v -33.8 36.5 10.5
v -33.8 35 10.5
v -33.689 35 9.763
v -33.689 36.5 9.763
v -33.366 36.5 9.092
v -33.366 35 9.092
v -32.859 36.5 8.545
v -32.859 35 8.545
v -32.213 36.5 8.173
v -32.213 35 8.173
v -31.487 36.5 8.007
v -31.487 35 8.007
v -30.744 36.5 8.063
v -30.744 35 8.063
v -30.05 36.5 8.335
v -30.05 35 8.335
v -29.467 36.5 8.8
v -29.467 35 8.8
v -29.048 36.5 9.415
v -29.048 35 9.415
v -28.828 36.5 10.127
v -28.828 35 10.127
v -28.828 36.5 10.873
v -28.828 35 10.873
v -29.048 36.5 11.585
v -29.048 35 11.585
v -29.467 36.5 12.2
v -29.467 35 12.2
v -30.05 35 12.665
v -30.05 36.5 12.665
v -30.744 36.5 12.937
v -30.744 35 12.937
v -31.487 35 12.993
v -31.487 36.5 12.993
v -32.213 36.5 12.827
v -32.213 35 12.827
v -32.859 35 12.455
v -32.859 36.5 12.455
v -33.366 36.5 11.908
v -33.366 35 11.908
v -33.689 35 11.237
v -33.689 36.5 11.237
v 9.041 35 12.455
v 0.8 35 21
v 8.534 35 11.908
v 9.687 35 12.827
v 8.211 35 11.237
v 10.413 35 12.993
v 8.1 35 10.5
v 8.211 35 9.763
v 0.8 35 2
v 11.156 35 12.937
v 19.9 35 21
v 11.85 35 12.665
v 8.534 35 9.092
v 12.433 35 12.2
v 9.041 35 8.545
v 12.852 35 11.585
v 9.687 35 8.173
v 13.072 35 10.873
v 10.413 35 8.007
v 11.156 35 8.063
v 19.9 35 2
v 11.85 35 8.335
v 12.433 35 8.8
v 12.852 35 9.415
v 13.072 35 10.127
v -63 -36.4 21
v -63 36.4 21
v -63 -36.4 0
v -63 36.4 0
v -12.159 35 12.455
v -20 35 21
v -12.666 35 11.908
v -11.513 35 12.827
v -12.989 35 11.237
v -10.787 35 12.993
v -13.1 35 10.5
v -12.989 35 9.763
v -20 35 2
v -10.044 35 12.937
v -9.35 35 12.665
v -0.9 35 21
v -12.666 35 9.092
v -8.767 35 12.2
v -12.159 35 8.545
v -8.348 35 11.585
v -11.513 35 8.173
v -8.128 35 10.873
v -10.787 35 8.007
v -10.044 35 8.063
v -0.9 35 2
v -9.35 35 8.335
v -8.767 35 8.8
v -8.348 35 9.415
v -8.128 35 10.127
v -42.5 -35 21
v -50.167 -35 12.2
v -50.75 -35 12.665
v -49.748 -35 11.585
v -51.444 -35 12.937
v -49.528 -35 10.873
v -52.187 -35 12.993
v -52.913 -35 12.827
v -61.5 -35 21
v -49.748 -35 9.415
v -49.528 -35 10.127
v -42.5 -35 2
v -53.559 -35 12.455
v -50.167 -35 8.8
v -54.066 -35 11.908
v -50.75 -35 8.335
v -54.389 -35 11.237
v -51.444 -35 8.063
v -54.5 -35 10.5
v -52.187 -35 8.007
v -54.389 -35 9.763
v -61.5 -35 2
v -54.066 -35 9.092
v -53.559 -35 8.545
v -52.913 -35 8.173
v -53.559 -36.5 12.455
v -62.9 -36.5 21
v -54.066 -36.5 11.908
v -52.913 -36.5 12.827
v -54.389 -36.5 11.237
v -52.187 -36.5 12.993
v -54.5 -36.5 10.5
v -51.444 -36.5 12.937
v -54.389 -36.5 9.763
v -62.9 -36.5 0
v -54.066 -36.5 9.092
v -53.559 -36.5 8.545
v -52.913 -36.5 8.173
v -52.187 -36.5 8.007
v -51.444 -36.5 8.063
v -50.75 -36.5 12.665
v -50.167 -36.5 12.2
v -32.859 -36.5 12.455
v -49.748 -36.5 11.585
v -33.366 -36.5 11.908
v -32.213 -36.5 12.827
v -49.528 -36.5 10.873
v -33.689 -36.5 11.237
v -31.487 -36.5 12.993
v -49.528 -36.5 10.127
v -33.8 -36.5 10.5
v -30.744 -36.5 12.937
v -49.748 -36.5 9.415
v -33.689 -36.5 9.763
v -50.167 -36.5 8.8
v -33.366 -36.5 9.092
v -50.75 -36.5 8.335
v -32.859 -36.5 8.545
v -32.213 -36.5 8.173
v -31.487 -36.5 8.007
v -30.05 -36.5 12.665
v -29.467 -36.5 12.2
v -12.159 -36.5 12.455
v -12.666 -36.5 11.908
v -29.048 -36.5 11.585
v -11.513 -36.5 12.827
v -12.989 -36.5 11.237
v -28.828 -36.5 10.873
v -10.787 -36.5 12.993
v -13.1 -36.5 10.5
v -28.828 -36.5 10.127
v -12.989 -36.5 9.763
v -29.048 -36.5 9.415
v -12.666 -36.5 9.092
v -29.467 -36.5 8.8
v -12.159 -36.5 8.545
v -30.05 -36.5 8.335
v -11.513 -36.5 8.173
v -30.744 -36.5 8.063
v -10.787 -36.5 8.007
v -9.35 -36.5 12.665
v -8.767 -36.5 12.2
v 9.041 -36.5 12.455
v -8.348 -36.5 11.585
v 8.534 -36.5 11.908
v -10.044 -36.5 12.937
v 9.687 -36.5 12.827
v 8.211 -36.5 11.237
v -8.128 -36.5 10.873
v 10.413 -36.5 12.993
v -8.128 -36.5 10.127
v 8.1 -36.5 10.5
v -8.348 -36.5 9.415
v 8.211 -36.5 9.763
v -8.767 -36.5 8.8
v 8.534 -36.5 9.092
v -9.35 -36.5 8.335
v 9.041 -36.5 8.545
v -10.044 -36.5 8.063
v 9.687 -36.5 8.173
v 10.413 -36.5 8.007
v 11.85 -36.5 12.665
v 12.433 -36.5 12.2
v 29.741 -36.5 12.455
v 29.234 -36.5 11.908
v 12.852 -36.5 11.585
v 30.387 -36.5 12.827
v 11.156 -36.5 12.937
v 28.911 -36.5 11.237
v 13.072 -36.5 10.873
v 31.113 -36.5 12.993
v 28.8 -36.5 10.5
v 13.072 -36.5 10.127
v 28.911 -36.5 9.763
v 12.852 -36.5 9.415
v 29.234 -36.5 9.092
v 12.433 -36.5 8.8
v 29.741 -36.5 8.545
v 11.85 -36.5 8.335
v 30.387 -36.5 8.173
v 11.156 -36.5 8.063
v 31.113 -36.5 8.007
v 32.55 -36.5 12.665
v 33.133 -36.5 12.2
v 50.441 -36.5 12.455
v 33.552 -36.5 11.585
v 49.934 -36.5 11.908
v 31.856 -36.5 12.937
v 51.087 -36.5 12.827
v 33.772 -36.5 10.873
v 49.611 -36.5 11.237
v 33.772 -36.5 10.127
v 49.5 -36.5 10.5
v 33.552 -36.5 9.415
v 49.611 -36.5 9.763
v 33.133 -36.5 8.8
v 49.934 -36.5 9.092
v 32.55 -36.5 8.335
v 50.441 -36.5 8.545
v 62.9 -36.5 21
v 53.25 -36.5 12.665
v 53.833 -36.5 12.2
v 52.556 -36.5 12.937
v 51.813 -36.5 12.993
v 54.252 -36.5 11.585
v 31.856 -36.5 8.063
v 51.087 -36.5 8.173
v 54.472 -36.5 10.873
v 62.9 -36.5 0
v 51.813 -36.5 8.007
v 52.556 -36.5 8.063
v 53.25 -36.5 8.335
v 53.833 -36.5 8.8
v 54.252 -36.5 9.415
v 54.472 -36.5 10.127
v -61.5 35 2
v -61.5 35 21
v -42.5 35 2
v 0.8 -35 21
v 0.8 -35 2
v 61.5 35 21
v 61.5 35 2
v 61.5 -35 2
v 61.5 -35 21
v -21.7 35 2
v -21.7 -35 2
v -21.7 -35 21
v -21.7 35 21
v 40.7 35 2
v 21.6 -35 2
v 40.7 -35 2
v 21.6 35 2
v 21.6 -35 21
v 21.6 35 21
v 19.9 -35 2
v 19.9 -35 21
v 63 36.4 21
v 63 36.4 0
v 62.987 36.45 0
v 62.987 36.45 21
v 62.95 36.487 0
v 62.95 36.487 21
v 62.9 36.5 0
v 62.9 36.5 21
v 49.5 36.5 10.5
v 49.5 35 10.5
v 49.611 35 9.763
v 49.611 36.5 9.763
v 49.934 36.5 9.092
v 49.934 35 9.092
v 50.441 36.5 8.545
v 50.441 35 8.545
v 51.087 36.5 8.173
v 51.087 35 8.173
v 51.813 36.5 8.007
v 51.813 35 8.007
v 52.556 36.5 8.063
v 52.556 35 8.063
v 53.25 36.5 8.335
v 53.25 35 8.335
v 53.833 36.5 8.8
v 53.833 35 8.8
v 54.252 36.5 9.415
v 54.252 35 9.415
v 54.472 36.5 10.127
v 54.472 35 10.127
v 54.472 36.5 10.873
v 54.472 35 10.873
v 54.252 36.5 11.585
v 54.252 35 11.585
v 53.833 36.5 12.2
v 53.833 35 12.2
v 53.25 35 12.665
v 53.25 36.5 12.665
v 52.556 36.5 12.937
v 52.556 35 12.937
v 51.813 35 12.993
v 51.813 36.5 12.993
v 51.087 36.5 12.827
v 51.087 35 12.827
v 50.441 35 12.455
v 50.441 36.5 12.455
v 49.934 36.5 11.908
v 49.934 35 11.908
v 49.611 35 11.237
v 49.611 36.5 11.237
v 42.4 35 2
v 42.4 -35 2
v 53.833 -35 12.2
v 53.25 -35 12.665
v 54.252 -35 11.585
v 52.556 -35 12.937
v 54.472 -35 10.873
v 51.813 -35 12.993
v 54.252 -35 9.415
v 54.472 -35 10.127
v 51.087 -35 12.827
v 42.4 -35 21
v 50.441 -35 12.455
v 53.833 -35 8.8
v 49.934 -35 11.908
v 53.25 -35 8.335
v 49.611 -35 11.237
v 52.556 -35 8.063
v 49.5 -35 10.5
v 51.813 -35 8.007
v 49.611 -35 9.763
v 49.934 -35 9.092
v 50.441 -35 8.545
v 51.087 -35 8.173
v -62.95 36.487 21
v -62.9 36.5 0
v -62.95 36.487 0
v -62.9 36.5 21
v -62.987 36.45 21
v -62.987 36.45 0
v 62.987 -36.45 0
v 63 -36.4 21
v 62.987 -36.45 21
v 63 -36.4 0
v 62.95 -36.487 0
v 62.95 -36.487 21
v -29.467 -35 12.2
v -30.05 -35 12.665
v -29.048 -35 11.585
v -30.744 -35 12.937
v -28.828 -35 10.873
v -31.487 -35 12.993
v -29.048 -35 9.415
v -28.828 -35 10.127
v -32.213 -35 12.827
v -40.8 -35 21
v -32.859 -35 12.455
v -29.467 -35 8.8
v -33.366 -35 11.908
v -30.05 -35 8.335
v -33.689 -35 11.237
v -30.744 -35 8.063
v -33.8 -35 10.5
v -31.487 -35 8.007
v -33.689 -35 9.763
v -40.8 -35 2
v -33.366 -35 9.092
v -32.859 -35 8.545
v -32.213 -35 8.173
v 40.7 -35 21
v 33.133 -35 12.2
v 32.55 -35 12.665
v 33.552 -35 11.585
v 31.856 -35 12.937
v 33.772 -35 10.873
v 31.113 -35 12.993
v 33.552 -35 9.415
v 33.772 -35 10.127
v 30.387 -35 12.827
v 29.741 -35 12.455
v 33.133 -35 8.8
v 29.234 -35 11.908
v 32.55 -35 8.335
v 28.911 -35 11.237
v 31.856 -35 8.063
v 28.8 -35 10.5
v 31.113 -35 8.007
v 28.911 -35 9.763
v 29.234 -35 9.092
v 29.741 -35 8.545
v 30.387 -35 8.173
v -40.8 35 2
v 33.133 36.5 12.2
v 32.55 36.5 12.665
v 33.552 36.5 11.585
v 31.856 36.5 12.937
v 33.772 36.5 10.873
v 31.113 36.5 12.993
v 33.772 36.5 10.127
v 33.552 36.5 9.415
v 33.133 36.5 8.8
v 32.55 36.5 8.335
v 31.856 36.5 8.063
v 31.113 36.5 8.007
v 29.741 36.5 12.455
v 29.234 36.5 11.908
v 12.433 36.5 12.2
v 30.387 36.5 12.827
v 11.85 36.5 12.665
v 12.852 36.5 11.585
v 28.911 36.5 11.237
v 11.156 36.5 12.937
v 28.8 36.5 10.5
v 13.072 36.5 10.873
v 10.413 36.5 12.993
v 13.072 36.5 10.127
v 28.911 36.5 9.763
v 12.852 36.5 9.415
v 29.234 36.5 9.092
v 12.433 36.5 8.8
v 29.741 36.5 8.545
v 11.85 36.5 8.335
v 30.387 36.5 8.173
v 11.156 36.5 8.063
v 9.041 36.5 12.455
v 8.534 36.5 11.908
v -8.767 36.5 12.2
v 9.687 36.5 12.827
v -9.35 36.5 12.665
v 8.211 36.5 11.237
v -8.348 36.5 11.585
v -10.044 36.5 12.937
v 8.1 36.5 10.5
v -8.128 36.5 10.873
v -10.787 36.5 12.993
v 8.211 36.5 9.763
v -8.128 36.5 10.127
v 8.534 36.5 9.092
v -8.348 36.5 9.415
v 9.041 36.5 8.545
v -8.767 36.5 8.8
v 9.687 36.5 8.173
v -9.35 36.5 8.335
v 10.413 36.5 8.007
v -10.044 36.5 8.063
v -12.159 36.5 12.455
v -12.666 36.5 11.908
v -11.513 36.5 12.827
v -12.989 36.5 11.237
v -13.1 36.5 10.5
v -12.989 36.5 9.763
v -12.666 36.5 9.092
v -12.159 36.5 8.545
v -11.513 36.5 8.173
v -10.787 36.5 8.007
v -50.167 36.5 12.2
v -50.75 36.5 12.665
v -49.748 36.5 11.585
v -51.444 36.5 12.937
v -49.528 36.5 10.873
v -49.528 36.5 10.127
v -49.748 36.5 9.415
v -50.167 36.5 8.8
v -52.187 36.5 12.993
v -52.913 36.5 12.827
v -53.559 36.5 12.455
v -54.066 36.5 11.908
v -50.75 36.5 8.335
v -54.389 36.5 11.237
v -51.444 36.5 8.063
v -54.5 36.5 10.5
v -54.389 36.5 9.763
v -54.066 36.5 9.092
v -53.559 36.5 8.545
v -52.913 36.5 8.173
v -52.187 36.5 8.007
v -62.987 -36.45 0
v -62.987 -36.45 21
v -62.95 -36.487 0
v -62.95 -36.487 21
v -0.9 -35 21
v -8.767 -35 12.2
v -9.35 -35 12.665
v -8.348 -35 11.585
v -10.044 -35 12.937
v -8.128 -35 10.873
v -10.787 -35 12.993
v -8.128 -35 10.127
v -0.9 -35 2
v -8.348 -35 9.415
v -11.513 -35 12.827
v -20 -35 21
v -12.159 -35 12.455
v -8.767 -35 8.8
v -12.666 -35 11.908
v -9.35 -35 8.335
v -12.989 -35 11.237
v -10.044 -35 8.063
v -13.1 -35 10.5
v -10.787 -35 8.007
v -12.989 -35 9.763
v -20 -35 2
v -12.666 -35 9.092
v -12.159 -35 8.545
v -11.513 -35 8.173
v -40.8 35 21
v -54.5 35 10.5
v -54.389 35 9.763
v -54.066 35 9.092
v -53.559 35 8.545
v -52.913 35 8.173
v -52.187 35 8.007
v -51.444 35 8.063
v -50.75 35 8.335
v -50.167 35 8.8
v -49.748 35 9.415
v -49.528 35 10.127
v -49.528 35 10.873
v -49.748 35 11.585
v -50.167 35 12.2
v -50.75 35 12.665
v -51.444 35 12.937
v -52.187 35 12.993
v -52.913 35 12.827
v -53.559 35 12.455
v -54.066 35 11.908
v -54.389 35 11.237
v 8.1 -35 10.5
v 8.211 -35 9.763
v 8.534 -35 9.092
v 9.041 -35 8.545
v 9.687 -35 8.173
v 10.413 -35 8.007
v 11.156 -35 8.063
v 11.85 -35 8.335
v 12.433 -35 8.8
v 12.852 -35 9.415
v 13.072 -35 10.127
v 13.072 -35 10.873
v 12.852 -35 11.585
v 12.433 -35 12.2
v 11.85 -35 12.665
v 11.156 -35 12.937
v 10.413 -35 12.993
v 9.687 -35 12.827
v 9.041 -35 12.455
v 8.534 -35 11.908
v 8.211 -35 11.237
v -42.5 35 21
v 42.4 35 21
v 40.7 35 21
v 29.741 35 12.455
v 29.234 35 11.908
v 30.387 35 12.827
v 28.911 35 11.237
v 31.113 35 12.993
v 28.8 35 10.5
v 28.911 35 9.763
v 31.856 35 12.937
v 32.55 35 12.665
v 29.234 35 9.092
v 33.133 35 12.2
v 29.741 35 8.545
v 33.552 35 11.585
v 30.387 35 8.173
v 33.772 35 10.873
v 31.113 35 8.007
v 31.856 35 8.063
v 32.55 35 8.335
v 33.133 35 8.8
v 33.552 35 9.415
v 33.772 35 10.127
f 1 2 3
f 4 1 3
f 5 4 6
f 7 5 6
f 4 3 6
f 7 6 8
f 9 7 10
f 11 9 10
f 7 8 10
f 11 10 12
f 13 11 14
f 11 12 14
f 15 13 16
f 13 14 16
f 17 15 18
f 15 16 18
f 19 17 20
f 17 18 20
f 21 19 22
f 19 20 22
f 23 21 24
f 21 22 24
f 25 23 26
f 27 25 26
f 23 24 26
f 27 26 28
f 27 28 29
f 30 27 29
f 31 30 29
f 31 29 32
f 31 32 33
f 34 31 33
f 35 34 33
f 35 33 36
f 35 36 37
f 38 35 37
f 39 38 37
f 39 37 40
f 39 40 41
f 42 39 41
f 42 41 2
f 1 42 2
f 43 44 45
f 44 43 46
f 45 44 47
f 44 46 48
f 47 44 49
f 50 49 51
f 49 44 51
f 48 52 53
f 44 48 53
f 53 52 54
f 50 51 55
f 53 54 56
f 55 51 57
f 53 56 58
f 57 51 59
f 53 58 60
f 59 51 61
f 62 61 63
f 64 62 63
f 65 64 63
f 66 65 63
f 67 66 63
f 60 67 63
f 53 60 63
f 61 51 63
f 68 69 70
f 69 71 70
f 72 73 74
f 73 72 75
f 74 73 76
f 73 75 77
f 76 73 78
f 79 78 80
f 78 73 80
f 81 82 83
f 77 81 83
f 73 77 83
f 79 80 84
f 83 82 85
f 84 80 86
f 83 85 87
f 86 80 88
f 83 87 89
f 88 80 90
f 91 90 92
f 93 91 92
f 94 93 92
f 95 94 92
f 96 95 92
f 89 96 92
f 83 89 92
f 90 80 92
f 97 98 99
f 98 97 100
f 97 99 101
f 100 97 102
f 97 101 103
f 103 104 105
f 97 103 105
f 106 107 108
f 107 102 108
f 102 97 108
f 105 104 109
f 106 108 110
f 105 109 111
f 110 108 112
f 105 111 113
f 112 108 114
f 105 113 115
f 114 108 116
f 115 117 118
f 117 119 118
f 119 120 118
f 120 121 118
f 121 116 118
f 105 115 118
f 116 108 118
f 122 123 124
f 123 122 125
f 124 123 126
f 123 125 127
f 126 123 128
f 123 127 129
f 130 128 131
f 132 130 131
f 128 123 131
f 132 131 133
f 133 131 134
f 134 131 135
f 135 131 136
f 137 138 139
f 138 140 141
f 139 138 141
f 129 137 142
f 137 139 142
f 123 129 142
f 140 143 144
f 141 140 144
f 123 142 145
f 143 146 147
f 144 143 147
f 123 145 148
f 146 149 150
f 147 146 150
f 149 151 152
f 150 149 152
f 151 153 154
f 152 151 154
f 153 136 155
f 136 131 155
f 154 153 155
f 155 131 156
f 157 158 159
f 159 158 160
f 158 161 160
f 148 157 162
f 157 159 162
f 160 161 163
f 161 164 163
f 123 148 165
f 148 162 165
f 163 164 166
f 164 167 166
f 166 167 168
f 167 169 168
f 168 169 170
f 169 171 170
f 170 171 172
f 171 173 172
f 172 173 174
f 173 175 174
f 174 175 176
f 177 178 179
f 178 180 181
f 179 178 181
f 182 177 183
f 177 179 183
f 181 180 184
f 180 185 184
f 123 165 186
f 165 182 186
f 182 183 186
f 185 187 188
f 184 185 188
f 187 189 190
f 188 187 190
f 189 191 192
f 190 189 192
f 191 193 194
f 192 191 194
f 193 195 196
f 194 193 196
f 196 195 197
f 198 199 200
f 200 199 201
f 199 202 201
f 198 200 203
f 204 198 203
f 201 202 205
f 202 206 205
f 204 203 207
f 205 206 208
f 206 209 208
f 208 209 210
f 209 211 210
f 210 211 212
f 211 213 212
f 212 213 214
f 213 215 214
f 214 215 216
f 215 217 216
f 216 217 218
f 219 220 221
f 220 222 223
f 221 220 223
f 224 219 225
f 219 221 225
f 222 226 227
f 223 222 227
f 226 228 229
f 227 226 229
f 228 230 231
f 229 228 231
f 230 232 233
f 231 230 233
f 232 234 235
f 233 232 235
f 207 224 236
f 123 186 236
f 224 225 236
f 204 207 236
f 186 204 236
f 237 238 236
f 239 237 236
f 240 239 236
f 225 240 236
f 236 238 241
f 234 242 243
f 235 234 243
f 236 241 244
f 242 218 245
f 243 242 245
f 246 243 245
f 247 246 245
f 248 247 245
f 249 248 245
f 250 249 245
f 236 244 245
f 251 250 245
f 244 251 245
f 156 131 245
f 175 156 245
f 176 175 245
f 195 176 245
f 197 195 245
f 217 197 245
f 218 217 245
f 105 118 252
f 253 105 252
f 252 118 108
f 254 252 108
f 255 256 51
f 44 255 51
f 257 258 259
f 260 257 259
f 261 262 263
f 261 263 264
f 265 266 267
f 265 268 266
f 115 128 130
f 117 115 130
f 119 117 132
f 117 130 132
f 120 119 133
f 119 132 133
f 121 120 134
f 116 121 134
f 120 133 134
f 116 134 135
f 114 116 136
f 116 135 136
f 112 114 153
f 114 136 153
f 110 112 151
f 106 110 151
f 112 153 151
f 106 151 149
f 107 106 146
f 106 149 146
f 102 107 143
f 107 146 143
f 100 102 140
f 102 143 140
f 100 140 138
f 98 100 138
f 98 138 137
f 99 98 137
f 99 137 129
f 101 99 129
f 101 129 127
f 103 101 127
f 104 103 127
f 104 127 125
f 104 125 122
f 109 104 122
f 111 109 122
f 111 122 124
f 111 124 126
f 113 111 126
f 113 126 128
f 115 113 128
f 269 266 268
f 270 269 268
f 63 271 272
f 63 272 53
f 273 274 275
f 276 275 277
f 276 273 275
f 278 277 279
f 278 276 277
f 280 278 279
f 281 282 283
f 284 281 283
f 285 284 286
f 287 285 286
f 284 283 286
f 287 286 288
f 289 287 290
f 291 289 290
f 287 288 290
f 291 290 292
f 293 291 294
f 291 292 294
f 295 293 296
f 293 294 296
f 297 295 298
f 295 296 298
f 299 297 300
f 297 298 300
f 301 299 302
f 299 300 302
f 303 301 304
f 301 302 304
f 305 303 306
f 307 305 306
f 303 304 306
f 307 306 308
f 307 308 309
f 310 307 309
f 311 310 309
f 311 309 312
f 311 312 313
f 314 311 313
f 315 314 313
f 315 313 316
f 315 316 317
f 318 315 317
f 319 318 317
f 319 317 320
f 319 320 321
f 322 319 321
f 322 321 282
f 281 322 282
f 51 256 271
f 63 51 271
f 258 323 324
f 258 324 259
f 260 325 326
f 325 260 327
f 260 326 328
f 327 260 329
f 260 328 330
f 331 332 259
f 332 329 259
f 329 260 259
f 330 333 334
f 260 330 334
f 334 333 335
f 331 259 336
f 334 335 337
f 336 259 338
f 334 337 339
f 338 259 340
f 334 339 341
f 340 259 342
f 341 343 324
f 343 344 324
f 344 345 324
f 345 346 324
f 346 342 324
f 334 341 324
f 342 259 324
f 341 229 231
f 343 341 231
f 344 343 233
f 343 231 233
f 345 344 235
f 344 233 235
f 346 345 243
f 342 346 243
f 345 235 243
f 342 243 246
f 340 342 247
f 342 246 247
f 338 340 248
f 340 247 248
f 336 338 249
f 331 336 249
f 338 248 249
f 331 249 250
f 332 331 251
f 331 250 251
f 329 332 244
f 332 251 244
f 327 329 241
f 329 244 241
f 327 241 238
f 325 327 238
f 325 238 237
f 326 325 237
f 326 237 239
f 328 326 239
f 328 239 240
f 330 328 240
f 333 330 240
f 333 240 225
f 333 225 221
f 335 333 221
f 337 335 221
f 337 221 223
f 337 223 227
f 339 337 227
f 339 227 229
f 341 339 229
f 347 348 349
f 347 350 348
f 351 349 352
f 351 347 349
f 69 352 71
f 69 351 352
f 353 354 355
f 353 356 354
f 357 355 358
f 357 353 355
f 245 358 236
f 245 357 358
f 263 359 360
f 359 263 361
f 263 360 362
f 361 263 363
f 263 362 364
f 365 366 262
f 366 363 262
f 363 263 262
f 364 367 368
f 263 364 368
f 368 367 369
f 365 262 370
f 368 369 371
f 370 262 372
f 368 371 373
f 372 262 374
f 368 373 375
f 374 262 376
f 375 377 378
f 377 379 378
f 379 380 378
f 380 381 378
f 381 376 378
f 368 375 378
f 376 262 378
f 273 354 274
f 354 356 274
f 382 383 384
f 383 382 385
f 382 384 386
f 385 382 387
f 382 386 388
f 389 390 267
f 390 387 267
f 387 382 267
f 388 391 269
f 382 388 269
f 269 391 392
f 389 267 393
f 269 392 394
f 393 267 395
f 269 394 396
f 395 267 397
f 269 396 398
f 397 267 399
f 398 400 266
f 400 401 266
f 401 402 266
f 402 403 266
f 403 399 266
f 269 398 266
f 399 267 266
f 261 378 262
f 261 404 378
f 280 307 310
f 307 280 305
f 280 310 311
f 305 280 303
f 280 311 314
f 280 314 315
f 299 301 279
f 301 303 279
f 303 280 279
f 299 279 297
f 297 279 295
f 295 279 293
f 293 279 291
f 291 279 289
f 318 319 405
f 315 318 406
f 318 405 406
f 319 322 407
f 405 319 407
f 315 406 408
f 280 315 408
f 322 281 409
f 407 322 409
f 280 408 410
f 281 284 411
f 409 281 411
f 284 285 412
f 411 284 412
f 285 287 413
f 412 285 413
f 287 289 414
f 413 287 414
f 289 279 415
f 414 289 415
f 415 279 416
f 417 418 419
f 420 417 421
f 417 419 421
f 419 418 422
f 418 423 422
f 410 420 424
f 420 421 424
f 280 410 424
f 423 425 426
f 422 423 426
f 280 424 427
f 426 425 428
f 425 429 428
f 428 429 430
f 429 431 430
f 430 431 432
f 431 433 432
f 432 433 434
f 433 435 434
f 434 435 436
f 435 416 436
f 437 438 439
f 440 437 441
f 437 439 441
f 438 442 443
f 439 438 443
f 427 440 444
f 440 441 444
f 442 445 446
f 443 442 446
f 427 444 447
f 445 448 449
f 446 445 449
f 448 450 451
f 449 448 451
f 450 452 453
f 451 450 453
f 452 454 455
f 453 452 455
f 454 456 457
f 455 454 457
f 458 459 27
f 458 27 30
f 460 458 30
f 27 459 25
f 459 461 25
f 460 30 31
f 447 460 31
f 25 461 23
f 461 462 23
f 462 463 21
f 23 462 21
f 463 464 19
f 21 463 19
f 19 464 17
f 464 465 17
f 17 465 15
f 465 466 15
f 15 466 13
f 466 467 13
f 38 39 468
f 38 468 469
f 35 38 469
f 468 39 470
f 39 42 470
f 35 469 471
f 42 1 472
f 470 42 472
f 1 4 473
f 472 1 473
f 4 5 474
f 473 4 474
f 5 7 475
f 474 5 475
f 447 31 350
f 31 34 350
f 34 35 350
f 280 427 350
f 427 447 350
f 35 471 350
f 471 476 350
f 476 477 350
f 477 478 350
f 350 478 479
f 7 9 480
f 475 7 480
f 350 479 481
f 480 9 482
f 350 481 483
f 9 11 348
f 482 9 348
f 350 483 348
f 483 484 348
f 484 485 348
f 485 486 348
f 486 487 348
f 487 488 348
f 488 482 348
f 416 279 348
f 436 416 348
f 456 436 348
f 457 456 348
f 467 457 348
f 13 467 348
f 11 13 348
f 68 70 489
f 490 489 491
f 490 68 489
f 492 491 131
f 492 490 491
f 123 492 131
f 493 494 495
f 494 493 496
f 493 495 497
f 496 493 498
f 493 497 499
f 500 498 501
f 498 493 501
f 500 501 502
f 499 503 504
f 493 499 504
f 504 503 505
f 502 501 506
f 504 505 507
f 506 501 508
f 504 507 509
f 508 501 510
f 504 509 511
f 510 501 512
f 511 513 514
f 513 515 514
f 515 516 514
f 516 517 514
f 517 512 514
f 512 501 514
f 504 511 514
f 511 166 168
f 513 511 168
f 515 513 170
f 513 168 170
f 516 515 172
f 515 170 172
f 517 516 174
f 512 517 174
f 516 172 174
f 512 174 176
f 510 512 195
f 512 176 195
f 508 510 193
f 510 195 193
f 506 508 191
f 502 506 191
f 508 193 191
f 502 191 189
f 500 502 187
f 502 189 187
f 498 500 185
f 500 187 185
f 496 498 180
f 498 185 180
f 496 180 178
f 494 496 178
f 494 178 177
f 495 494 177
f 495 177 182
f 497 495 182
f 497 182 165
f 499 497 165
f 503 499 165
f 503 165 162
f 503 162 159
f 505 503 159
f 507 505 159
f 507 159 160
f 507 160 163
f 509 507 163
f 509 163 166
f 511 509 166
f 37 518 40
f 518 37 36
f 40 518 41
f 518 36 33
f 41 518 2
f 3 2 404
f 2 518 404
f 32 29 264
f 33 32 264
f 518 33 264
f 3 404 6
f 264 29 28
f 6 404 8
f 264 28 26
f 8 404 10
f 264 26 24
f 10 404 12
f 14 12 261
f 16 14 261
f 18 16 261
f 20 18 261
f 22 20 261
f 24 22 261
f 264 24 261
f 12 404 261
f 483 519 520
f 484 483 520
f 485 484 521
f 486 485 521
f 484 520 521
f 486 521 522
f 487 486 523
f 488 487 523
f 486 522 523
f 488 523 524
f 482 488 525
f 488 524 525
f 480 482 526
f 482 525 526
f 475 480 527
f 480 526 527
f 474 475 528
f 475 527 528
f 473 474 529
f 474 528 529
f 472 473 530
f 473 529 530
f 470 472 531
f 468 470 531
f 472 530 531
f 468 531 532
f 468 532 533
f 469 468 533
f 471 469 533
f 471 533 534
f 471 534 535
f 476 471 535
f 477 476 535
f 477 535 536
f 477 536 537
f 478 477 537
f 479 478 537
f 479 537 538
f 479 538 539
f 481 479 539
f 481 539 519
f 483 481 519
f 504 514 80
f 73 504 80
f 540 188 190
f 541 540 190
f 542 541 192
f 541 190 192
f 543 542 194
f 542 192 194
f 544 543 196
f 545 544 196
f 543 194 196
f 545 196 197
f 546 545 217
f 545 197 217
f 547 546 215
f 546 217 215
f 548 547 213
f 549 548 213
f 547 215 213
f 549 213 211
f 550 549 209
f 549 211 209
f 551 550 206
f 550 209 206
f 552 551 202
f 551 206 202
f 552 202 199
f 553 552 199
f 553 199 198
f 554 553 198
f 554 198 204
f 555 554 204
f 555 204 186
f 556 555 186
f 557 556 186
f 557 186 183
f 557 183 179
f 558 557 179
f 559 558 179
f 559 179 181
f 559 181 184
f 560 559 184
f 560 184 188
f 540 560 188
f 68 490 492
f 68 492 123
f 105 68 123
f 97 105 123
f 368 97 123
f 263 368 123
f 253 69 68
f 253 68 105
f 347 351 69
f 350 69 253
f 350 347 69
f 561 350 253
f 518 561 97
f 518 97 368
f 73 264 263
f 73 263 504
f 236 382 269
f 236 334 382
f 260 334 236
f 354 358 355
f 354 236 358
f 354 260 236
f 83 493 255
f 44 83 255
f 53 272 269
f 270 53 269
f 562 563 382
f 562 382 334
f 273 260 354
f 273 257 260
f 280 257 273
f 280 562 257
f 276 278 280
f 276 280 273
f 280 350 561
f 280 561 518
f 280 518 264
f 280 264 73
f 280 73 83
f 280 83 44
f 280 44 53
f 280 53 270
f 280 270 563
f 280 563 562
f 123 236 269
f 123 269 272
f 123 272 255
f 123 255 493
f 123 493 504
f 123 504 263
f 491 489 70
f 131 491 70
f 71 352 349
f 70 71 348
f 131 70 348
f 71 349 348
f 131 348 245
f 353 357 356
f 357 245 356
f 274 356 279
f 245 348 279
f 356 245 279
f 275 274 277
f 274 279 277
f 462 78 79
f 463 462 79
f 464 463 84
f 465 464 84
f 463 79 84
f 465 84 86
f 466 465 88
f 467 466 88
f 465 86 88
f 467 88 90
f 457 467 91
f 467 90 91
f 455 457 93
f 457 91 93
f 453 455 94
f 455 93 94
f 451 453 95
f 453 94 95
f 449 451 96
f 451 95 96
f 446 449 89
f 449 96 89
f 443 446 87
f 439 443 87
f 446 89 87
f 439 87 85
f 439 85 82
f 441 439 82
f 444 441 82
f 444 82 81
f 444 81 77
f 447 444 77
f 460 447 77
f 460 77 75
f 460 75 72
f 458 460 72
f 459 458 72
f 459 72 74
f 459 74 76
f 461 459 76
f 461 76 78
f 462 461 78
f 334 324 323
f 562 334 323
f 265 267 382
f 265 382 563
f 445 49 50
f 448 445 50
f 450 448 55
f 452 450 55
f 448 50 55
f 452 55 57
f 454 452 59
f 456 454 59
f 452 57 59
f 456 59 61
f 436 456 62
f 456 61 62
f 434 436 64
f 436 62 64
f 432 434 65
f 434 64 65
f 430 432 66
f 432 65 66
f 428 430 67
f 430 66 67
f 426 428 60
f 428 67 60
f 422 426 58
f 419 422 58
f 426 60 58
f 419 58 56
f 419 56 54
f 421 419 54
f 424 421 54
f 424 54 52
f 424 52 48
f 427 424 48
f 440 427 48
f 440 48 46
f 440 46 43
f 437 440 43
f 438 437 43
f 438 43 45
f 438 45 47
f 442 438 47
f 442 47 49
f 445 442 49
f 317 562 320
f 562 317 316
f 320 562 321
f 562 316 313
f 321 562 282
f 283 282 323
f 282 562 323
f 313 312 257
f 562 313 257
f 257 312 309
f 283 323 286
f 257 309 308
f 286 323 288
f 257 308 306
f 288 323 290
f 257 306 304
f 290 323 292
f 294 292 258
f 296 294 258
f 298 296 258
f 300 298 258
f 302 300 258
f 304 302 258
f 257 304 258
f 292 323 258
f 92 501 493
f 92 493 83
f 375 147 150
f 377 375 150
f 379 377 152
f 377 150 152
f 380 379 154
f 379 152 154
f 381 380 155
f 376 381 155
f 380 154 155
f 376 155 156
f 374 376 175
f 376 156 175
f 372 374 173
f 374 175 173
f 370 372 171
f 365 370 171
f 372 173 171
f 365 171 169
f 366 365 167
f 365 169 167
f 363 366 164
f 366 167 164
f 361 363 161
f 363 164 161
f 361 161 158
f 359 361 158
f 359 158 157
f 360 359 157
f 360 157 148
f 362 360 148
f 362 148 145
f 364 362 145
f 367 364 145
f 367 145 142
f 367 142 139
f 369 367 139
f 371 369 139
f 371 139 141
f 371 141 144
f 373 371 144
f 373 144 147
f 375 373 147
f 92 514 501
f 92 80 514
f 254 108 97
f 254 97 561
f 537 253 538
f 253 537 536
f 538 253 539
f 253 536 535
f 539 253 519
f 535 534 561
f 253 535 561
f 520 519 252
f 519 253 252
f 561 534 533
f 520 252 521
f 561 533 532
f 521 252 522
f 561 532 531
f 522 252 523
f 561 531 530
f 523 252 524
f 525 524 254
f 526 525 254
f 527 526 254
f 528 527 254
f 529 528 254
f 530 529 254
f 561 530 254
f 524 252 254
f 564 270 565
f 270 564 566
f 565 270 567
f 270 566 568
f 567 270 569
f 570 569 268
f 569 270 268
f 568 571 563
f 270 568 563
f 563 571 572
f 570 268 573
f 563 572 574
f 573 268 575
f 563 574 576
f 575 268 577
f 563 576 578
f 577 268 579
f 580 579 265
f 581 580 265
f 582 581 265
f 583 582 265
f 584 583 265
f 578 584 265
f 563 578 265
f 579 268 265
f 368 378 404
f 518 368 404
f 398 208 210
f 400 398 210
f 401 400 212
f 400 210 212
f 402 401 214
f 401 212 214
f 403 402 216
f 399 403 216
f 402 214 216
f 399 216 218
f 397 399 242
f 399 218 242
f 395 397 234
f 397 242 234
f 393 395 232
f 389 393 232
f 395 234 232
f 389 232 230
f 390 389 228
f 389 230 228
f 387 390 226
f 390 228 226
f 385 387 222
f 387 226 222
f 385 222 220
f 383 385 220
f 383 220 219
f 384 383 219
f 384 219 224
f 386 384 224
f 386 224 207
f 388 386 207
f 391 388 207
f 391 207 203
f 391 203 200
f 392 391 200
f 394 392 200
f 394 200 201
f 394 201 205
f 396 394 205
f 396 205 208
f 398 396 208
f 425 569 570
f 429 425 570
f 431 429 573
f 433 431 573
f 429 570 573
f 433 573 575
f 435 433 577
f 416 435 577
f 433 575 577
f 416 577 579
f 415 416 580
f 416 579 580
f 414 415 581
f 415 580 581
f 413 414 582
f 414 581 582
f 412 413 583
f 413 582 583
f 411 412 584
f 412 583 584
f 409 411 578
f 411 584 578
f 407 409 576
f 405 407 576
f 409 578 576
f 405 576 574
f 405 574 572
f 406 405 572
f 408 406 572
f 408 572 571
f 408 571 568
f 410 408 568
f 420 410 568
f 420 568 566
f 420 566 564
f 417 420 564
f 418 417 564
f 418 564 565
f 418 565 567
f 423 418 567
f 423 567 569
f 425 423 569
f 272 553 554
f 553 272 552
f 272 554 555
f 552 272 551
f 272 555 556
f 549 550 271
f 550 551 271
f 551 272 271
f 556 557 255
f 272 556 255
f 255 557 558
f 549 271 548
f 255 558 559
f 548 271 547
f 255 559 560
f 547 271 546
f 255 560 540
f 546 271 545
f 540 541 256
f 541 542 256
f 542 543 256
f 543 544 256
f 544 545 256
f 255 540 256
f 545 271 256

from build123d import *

# Parameters (mm, degrees)
F0_W     = 126
F0_H     = 73
F1_DEPTH = 2
F2_W     = 1.7
F2_H     = 1.5
F2_W_2   = 19.1
F2_H_2   = 70
F3_DEPTH = 19
F5_DEPTH = 100
F6_R     = 0.1


with BuildPart() as f1:
    # F0 (on Top) → F1 (new body)
    with BuildSketch(Plane.XY):
        Rectangle(F0_W, F0_H)
    extrude(amount=F1_DEPTH)

    # F2 (on face) → F3 (join)
    with BuildSketch(Plane.XY.offset(2)):
        Polygon((42.4, 35), (61.5, 35), (61.5, -35), (42.4, -35), (42.4, -36.5), (63, -36.5), (63, 36.5), (42.4, 36.5), align=None)
        with Locations((41.55, 35.75)):
            Rectangle(F2_W, F2_H)
        with Locations((31.15, 35.75)):
            Rectangle(F2_W_2, F2_H)
        with Locations((41.55, -35.75)):
            Rectangle(F2_W, F2_H)
        with Locations((20.75, 35.75)):
            Rectangle(F2_W, F2_H)
        with Locations((31.15, -35.75)):
            Rectangle(F2_W_2, F2_H)
        with Locations((10.35, 35.75)):
            Rectangle(F2_W_2, F2_H)
        with Locations((20.75, -35.75)):
            Rectangle(F2_W, F2_H)
        with Locations((-0.05, 35.75)):
            Rectangle(F2_W, F2_H)
        with Locations((10.35, -35.75)):
            Rectangle(F2_W_2, F2_H)
        with Locations((-10.45, 35.75)):
            Rectangle(F2_W_2, F2_H)
        with Locations((-0.05, -35.75)):
            Rectangle(F2_W, F2_H)
        with Locations((-20.85, 35.75)):
            Rectangle(F2_W, F2_H)
        with Locations((-10.45, -35.75)):
            Rectangle(F2_W_2, F2_H)
        with Locations((-31.25, 35.75)):
            Rectangle(F2_W_2, F2_H)
        with Locations((-20.85, -35.75)):
            Rectangle(F2_W, F2_H)
        with Locations((-41.65, 35.75)):
            Rectangle(F2_W, F2_H)
        with Locations((-31.25, -35.75)):
            Rectangle(F2_W_2, F2_H)
        Polygon((-61.5, 35), (-42.5, 35), (-42.5, 36.5), (-63, 36.5), (-63, -36.5), (-42.5, -36.5), (-42.5, -35), (-61.5, -35), align=None)
        with Locations((-41.65, -35.75)):
            Rectangle(F2_W, F2_H)
        with Locations((-41.65, 0)):
            Rectangle(F2_W, F2_H_2)
        with Locations((-20.85, 0)):
            Rectangle(F2_W, F2_H_2)
        with Locations((-0.05, 0)):
            Rectangle(F2_W, F2_H_2)
        with Locations((20.75, 0)):
            Rectangle(F2_W, F2_H_2)
        with Locations((41.55, 0)):
            Rectangle(F2_W, F2_H_2)
    extrude(amount=F3_DEPTH)

    # F4 (on face) → F5 (cut)
    with BuildSketch(Plane.XZ.offset(36.5)):
        with BuildLine():
            ThreePointArc((-49.5, 10.5), (-52, 13), (-54.5, 10.5))
            Line((-54.5, 10.5), (-49.5, 10.5))
        make_face()
        with BuildLine():
            ThreePointArc((54.5, 10.5), (52, 13), (49.5, 10.5))
            Line((49.5, 10.5), (54.5, 10.5))
        make_face()
        with BuildLine():
            Line((54.5, 10.5), (49.5, 10.5))
            ThreePointArc((49.5, 10.5), (52, 8), (54.5, 10.5))
        make_face()
        with BuildLine():
            ThreePointArc((33.8, 10.5), (31.3, 13), (28.8, 10.5))
            Line((28.8, 10.5), (33.8, 10.5))
        make_face()
        with BuildLine():
            Line((33.8, 10.5), (28.8, 10.5))
            ThreePointArc((28.8, 10.5), (31.3, 8), (33.8, 10.5))
        make_face()
        with BuildLine():
            ThreePointArc((13.1, 10.5), (10.6, 13), (8.1, 10.5))
            Line((8.1, 10.5), (13.1, 10.5))
        make_face()
        with BuildLine():
            Line((13.1, 10.5), (8.1, 10.5))
            ThreePointArc((8.1, 10.5), (10.6, 8), (13.1, 10.5))
        make_face()
        with BuildLine():
            ThreePointArc((-8.1, 10.5), (-10.6, 13), (-13.1, 10.5))
            Line((-13.1, 10.5), (-8.1, 10.5))
        make_face()
        with BuildLine():
            Line((-8.1, 10.5), (-13.1, 10.5))
            ThreePointArc((-13.1, 10.5), (-10.6, 8), (-8.1, 10.5))
        make_face()
        with BuildLine():
            ThreePointArc((-28.8, 10.5), (-31.3, 13), (-33.8, 10.5))
            Line((-33.8, 10.5), (-28.8, 10.5))
        make_face()
        with BuildLine():
            Line((-28.8, 10.5), (-33.8, 10.5))
            ThreePointArc((-33.8, 10.5), (-31.3, 8), (-28.8, 10.5))
        make_face()
        with BuildLine():
            Line((-49.5, 10.5), (-54.5, 10.5))
            ThreePointArc((-54.5, 10.5), (-52, 8), (-49.5, 10.5))
        make_face()
    extrude(amount=-F5_DEPTH, mode=Mode.SUBTRACT)

    # F6
    f6_edges = [f1.edges().sort_by_distance(p)[0] for p in [
        (-63, -36.5, 10.5),
        (63, -36.5, 10.5),
        (63, 36.5, 10.5),
        (-63, 36.5, 10.5),
    ]]
    fillet(f6_edges, radius=F6_R)


solid = f1.part
